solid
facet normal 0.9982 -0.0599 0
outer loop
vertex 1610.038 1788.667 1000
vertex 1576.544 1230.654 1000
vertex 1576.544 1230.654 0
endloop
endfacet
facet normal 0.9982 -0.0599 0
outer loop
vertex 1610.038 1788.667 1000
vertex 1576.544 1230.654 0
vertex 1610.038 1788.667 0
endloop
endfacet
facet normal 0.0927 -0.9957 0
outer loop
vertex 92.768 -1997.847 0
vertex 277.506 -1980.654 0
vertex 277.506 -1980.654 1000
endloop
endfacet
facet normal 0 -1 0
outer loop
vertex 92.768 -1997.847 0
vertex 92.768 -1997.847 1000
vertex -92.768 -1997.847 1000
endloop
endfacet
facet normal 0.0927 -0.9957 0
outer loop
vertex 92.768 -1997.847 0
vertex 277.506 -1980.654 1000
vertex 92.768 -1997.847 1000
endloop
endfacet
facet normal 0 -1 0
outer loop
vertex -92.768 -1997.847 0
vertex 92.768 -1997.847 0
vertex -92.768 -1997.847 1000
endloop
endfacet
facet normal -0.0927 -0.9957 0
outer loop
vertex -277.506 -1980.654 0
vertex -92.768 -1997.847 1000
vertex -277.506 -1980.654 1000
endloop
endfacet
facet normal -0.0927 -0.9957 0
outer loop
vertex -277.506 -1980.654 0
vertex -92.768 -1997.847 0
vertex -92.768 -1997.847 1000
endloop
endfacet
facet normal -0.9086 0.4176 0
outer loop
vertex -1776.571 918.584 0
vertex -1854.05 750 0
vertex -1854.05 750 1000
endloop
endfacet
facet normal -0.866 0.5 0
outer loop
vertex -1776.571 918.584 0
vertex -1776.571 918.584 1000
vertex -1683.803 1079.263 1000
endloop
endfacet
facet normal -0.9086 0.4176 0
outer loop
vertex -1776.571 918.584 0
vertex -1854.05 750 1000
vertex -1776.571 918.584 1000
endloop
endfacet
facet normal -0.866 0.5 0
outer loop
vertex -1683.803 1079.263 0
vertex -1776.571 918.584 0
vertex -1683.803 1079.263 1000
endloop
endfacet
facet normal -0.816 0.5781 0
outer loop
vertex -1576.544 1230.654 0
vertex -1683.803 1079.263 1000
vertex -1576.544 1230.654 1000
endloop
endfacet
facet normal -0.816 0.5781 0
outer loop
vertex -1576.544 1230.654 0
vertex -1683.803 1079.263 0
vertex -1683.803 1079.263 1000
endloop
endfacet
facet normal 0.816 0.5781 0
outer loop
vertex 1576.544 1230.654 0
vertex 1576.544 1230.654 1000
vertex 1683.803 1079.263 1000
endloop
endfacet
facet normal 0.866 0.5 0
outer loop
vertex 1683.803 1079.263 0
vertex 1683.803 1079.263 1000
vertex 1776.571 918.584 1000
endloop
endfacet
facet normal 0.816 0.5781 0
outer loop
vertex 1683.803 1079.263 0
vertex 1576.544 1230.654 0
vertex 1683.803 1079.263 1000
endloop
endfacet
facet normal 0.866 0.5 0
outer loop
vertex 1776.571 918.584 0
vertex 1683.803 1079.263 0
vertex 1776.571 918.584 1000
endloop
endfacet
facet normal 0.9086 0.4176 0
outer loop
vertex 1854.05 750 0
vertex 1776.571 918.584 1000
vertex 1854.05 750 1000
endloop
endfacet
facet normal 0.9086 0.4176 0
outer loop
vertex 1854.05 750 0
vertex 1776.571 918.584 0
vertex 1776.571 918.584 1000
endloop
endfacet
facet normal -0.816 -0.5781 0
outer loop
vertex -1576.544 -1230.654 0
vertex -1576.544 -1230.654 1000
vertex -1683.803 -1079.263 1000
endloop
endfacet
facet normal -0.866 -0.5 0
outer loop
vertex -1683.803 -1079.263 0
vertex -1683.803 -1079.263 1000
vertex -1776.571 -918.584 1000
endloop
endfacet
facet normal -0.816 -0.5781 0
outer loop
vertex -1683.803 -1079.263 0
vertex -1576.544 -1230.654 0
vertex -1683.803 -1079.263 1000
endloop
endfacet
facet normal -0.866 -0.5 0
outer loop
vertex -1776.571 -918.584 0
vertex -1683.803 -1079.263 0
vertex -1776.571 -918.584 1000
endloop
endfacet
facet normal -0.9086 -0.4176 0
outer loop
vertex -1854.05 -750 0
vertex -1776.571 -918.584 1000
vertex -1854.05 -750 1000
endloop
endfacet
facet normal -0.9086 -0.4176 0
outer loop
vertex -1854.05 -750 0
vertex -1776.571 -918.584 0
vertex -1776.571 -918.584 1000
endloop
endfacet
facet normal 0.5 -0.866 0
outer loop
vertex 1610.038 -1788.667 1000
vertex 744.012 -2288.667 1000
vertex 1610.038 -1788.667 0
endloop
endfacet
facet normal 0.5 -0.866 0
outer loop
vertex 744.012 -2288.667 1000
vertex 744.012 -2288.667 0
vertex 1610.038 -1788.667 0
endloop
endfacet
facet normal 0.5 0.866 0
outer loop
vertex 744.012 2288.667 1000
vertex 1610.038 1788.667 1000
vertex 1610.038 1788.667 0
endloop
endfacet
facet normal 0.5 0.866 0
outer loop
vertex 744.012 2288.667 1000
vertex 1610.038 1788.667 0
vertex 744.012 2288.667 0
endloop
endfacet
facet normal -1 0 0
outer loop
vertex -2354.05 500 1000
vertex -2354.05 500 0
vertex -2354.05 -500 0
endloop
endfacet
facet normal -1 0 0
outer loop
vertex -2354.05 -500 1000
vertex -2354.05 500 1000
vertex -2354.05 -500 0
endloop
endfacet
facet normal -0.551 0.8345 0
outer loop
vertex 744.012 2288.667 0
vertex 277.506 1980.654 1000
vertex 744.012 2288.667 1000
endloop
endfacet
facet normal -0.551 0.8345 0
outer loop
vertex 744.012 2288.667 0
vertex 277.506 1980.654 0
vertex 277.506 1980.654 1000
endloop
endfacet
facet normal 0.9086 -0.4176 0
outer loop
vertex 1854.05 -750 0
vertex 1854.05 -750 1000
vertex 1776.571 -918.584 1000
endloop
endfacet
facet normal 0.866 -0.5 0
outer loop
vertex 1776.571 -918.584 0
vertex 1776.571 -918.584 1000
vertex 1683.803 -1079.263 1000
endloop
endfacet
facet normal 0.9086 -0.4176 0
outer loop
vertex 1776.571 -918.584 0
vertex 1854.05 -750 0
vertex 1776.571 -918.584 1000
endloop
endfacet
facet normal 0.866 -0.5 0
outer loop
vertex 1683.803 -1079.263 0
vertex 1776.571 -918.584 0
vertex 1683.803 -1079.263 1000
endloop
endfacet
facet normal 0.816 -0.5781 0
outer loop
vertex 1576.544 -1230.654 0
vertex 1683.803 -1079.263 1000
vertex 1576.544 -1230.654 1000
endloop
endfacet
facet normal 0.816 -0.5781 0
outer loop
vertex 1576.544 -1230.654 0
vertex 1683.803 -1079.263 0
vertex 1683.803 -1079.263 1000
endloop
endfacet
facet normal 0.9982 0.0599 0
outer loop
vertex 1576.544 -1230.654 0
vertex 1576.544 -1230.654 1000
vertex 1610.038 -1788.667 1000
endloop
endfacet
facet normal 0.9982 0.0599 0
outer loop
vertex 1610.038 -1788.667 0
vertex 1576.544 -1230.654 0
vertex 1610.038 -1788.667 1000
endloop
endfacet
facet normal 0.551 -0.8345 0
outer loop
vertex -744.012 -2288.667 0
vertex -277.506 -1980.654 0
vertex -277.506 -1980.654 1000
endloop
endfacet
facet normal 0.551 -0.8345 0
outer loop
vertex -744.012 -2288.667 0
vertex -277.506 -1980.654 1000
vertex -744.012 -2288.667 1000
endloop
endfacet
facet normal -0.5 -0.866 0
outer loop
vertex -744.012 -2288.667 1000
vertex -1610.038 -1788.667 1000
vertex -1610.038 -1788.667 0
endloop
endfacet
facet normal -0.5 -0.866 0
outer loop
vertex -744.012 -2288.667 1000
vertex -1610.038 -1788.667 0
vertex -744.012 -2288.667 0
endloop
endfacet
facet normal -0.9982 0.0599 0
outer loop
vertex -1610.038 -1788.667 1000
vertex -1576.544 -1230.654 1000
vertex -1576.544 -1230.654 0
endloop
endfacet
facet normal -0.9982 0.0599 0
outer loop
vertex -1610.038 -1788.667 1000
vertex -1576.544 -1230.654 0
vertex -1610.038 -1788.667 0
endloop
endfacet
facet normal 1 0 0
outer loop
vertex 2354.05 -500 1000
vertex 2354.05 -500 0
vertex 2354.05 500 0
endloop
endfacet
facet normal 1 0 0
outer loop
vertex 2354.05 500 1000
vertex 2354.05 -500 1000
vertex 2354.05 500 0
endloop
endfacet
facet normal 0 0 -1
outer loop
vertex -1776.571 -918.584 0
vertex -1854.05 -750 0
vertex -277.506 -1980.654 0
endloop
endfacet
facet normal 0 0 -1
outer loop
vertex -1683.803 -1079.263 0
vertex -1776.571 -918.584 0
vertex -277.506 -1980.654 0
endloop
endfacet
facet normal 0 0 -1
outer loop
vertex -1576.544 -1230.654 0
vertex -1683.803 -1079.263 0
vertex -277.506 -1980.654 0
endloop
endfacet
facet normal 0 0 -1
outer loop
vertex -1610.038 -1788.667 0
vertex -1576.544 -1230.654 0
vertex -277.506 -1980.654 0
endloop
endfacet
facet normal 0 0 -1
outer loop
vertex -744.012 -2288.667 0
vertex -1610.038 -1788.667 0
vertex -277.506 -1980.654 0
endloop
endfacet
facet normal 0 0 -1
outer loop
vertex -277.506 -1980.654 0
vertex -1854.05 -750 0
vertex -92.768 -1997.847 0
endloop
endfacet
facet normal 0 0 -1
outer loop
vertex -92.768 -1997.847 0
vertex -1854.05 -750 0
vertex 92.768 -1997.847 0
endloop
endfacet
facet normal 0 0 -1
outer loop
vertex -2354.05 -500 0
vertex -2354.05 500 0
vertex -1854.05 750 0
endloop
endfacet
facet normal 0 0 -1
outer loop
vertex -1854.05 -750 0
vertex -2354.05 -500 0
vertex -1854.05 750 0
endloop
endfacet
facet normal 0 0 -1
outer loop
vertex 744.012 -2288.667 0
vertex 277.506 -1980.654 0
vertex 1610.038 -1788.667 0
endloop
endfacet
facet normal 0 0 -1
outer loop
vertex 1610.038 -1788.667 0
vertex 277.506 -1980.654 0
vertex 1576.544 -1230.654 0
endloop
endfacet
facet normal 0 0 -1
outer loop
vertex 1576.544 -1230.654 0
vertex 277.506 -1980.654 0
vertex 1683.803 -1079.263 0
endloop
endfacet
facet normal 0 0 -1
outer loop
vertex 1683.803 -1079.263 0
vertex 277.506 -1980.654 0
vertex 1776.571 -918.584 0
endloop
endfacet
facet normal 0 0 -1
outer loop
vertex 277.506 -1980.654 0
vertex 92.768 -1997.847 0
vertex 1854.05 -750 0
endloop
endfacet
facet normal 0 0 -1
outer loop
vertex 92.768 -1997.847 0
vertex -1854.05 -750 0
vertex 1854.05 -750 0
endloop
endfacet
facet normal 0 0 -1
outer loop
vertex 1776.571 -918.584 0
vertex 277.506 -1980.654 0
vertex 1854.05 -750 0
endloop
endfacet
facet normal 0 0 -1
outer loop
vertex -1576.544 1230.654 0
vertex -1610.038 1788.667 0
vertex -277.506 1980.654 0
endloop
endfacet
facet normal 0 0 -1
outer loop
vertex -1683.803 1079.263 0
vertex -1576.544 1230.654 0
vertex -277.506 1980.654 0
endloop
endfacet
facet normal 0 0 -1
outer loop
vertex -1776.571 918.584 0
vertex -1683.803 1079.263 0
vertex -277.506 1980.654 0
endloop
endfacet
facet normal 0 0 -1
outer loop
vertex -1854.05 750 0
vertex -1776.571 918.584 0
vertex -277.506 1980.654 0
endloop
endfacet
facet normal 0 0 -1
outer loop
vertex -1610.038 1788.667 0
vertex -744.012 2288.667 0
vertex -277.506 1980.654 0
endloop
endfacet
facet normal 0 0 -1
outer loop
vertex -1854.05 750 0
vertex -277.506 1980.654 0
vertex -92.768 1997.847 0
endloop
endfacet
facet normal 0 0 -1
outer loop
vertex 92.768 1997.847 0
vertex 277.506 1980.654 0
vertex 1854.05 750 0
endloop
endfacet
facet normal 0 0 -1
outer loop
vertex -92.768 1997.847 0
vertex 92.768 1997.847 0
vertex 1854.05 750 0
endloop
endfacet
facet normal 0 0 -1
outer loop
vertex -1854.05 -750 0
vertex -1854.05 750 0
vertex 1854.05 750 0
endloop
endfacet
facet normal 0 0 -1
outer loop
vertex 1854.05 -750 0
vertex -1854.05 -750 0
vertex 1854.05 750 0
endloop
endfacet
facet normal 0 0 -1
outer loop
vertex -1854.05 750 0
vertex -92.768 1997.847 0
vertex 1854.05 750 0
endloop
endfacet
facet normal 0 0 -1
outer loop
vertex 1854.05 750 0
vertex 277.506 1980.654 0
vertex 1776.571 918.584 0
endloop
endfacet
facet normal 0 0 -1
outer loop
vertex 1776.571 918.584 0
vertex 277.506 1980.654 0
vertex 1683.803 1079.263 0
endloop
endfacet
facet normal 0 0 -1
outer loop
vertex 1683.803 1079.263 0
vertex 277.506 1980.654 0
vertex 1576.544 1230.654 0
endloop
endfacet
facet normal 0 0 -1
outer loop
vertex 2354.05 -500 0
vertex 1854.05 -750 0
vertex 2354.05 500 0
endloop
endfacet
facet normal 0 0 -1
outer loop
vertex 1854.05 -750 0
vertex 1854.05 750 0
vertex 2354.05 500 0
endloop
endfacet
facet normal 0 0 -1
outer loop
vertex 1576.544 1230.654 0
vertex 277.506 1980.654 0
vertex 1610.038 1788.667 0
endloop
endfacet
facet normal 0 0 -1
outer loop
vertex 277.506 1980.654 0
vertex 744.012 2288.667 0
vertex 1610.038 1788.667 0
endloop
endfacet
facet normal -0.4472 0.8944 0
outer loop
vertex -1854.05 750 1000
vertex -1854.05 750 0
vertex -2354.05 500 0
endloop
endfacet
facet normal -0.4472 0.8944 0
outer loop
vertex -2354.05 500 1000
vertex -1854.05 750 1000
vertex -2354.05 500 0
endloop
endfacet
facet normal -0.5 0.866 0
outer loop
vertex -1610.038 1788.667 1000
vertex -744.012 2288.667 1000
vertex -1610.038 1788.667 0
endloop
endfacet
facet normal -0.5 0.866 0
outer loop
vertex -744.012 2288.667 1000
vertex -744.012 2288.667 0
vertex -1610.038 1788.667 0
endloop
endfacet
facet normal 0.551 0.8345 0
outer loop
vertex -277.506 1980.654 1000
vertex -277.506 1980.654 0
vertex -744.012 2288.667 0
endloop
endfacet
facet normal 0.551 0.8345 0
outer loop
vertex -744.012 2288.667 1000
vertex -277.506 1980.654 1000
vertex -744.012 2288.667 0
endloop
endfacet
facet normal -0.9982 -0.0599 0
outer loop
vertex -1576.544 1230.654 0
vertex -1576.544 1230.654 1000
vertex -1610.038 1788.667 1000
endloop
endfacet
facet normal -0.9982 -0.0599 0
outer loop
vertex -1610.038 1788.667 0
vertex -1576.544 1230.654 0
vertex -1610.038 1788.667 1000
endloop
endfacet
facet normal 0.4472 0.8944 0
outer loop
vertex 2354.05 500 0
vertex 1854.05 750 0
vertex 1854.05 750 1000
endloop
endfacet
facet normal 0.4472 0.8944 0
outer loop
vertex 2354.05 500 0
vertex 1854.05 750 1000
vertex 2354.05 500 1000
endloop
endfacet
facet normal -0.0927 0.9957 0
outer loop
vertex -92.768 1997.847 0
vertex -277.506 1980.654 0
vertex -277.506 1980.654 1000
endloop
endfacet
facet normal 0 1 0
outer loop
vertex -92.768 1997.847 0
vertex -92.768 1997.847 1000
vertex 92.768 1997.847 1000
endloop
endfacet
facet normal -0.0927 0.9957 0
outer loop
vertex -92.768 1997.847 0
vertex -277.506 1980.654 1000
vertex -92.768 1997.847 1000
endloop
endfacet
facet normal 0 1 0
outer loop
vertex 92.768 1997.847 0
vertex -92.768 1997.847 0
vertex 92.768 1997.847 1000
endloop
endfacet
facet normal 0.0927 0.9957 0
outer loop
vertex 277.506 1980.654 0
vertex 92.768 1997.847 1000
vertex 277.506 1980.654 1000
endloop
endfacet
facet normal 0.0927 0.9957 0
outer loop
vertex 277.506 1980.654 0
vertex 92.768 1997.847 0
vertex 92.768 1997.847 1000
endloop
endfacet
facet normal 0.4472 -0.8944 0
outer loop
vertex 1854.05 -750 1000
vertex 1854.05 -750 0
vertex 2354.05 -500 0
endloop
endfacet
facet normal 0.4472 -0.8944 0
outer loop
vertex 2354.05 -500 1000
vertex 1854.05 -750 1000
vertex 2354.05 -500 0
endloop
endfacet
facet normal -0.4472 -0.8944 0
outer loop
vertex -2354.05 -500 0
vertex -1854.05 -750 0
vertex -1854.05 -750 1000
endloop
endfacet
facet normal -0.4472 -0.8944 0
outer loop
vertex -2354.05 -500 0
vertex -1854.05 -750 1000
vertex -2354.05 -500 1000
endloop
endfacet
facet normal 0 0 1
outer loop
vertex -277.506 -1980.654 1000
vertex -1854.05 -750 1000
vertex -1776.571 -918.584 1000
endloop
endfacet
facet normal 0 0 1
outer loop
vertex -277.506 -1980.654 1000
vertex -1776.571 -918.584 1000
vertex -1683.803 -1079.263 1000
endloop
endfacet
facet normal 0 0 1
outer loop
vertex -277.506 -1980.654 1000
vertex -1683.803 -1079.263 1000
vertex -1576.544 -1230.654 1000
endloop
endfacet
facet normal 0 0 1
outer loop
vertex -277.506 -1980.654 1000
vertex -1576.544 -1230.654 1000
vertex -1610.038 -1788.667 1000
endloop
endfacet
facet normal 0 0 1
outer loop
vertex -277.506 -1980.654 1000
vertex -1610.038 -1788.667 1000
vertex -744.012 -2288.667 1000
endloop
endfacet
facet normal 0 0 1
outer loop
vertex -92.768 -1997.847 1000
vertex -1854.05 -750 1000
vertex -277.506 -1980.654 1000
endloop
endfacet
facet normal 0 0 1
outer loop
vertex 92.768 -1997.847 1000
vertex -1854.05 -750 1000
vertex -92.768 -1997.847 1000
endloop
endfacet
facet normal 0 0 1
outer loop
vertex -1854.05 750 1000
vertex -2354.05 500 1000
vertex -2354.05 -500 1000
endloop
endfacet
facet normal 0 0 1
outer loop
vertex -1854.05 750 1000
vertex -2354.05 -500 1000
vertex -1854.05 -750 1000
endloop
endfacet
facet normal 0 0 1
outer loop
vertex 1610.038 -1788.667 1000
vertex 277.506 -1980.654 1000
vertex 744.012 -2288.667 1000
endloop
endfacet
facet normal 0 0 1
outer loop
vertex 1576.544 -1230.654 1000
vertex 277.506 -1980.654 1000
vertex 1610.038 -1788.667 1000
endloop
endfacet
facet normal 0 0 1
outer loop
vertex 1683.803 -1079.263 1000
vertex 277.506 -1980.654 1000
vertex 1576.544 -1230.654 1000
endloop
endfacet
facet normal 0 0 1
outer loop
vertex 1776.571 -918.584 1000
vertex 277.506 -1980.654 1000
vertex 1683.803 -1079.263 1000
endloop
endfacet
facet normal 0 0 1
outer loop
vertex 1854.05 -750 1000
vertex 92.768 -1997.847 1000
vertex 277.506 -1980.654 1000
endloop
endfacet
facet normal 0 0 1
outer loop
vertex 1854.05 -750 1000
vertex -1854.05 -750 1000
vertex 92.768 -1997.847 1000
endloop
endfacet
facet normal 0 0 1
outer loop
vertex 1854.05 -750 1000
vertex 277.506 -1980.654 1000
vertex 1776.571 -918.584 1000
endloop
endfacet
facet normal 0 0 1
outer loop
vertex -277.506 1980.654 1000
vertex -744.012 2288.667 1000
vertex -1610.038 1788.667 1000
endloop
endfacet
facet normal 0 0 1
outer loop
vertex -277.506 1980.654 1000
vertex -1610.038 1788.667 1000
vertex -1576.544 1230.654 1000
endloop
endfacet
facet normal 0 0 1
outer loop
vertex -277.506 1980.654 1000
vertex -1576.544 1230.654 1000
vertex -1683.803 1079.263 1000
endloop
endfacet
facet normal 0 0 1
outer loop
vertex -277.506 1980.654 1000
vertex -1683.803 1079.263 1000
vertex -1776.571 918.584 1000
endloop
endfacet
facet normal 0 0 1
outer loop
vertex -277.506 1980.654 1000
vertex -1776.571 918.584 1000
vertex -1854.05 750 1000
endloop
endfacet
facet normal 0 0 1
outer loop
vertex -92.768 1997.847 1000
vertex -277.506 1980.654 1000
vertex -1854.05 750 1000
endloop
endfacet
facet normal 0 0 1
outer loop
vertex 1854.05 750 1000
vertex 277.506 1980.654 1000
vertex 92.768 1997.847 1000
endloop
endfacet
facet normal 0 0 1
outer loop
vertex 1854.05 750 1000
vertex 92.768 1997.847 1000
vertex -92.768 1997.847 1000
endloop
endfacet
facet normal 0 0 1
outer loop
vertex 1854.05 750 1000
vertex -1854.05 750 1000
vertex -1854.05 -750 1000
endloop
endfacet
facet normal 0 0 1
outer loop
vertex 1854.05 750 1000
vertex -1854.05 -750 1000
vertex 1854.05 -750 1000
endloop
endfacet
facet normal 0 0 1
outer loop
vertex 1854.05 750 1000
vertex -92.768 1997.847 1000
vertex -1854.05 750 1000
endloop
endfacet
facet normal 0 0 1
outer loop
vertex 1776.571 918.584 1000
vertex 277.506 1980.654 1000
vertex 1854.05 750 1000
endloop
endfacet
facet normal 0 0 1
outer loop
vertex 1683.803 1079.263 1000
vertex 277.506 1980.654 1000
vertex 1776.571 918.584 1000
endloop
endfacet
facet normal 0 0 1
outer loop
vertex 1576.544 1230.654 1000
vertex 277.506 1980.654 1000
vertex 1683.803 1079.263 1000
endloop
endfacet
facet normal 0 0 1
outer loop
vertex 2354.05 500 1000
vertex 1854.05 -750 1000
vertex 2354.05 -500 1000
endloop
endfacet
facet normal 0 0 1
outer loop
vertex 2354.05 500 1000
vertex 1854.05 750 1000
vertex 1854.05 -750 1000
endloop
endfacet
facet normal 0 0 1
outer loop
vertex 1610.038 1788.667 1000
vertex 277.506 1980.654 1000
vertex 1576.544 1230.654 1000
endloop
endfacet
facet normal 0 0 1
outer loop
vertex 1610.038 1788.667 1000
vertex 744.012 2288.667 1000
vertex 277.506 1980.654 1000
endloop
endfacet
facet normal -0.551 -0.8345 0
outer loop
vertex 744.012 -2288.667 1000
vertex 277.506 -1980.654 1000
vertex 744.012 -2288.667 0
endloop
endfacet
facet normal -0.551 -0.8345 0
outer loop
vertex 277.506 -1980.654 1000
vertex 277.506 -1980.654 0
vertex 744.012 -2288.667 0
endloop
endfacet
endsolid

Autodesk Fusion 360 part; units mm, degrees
sketch "スケッチ1" plane through (0, 0, 0) normal (0, 0, 1) x (1, 0, 0)
  line L0 (-2354.0496, 500) -> (-2354.0496, -500)
  line L1 (-1854.0496, -750) -> (-1854.0496, 750) construction
  line L2 (-1854.0496, 750) -> (-2354.0496, 500)
  line L3 (-1854.0496, -750) -> (-2354.0496, -500)
  line L4 (-1610.0375, -1788.6668) -> (-744.0121, -2288.6668)
  line L5 (-277.5058, -1980.6541) -> (-1576.5439, -1230.6541) construction
  line L6 (-1576.5439, -1230.6541) -> (-1610.0375, -1788.6668)
  line L7 (-277.5058, -1980.6541) -> (-744.0121, -2288.6668)
  line L8 (744.0121, -2288.6668) -> (1610.0375, -1788.6668)
  line L9 (1576.5439, -1230.6541) -> (277.5058, -1980.6541) construction
  line L10 (277.5058, -1980.6541) -> (744.0121, -2288.6668)
  line L11 (1576.5439, -1230.6541) -> (1610.0375, -1788.6668)
  line L12 (2354.0496, -500) -> (2354.0496, 500)
  line L13 (1854.0496, 750) -> (1854.0496, -750) construction
  line L14 (1854.0496, -750) -> (2354.0496, -500)
  line L15 (1854.0496, 750) -> (2354.0496, 500)
  line L16 (1610.0375, 1788.6668) -> (744.0121, 2288.6668)
  line L17 (277.5058, 1980.6541) -> (1576.5439, 1230.6541) construction
  line L18 (1576.5439, 1230.6541) -> (1610.0375, 1788.6668)
  line L19 (277.5058, 1980.6541) -> (744.0121, 2288.6668)
  line L20 (-744.0121, 2288.6668) -> (-1610.0375, 1788.6668)
  line L21 (-1576.5439, 1230.6541) -> (-277.5058, 1980.6541) construction
  line L22 (-277.5058, 1980.6541) -> (-744.0121, 2288.6668)
  line L23 (-1576.5439, 1230.6541) -> (-1610.0375, 1788.6668)
  arc A0 (-1576.5439, 1230.6541) -> (-1854.0496, 750) centre (0, 0) ccw
  arc A1 (277.5058, 1980.6541) -> (-277.5058, 1980.6541) centre (0, 0) ccw
  arc A2 (1854.0496, 750) -> (1576.5439, 1230.6541) centre (0, 0) ccw
  arc A3 (1576.5439, -1230.6541) -> (1854.0496, -750) centre (0, 0) ccw
  arc A4 (-1854.0496, -750) -> (-1576.5439, -1230.6541) centre (0, 0) ccw
  arc A5 (-277.5058, -1980.6541) -> (277.5058, -1980.6541) centre (0, 0) ccw
  dimension "d16" = 500
  dimension "d18" = 2000
  dimension "d19" = 1000
  dimension "d20" = 1500
  dimension "d22" = 360
extrude "押し出し1" add sketch "スケッチ1" along normal blind 1000
